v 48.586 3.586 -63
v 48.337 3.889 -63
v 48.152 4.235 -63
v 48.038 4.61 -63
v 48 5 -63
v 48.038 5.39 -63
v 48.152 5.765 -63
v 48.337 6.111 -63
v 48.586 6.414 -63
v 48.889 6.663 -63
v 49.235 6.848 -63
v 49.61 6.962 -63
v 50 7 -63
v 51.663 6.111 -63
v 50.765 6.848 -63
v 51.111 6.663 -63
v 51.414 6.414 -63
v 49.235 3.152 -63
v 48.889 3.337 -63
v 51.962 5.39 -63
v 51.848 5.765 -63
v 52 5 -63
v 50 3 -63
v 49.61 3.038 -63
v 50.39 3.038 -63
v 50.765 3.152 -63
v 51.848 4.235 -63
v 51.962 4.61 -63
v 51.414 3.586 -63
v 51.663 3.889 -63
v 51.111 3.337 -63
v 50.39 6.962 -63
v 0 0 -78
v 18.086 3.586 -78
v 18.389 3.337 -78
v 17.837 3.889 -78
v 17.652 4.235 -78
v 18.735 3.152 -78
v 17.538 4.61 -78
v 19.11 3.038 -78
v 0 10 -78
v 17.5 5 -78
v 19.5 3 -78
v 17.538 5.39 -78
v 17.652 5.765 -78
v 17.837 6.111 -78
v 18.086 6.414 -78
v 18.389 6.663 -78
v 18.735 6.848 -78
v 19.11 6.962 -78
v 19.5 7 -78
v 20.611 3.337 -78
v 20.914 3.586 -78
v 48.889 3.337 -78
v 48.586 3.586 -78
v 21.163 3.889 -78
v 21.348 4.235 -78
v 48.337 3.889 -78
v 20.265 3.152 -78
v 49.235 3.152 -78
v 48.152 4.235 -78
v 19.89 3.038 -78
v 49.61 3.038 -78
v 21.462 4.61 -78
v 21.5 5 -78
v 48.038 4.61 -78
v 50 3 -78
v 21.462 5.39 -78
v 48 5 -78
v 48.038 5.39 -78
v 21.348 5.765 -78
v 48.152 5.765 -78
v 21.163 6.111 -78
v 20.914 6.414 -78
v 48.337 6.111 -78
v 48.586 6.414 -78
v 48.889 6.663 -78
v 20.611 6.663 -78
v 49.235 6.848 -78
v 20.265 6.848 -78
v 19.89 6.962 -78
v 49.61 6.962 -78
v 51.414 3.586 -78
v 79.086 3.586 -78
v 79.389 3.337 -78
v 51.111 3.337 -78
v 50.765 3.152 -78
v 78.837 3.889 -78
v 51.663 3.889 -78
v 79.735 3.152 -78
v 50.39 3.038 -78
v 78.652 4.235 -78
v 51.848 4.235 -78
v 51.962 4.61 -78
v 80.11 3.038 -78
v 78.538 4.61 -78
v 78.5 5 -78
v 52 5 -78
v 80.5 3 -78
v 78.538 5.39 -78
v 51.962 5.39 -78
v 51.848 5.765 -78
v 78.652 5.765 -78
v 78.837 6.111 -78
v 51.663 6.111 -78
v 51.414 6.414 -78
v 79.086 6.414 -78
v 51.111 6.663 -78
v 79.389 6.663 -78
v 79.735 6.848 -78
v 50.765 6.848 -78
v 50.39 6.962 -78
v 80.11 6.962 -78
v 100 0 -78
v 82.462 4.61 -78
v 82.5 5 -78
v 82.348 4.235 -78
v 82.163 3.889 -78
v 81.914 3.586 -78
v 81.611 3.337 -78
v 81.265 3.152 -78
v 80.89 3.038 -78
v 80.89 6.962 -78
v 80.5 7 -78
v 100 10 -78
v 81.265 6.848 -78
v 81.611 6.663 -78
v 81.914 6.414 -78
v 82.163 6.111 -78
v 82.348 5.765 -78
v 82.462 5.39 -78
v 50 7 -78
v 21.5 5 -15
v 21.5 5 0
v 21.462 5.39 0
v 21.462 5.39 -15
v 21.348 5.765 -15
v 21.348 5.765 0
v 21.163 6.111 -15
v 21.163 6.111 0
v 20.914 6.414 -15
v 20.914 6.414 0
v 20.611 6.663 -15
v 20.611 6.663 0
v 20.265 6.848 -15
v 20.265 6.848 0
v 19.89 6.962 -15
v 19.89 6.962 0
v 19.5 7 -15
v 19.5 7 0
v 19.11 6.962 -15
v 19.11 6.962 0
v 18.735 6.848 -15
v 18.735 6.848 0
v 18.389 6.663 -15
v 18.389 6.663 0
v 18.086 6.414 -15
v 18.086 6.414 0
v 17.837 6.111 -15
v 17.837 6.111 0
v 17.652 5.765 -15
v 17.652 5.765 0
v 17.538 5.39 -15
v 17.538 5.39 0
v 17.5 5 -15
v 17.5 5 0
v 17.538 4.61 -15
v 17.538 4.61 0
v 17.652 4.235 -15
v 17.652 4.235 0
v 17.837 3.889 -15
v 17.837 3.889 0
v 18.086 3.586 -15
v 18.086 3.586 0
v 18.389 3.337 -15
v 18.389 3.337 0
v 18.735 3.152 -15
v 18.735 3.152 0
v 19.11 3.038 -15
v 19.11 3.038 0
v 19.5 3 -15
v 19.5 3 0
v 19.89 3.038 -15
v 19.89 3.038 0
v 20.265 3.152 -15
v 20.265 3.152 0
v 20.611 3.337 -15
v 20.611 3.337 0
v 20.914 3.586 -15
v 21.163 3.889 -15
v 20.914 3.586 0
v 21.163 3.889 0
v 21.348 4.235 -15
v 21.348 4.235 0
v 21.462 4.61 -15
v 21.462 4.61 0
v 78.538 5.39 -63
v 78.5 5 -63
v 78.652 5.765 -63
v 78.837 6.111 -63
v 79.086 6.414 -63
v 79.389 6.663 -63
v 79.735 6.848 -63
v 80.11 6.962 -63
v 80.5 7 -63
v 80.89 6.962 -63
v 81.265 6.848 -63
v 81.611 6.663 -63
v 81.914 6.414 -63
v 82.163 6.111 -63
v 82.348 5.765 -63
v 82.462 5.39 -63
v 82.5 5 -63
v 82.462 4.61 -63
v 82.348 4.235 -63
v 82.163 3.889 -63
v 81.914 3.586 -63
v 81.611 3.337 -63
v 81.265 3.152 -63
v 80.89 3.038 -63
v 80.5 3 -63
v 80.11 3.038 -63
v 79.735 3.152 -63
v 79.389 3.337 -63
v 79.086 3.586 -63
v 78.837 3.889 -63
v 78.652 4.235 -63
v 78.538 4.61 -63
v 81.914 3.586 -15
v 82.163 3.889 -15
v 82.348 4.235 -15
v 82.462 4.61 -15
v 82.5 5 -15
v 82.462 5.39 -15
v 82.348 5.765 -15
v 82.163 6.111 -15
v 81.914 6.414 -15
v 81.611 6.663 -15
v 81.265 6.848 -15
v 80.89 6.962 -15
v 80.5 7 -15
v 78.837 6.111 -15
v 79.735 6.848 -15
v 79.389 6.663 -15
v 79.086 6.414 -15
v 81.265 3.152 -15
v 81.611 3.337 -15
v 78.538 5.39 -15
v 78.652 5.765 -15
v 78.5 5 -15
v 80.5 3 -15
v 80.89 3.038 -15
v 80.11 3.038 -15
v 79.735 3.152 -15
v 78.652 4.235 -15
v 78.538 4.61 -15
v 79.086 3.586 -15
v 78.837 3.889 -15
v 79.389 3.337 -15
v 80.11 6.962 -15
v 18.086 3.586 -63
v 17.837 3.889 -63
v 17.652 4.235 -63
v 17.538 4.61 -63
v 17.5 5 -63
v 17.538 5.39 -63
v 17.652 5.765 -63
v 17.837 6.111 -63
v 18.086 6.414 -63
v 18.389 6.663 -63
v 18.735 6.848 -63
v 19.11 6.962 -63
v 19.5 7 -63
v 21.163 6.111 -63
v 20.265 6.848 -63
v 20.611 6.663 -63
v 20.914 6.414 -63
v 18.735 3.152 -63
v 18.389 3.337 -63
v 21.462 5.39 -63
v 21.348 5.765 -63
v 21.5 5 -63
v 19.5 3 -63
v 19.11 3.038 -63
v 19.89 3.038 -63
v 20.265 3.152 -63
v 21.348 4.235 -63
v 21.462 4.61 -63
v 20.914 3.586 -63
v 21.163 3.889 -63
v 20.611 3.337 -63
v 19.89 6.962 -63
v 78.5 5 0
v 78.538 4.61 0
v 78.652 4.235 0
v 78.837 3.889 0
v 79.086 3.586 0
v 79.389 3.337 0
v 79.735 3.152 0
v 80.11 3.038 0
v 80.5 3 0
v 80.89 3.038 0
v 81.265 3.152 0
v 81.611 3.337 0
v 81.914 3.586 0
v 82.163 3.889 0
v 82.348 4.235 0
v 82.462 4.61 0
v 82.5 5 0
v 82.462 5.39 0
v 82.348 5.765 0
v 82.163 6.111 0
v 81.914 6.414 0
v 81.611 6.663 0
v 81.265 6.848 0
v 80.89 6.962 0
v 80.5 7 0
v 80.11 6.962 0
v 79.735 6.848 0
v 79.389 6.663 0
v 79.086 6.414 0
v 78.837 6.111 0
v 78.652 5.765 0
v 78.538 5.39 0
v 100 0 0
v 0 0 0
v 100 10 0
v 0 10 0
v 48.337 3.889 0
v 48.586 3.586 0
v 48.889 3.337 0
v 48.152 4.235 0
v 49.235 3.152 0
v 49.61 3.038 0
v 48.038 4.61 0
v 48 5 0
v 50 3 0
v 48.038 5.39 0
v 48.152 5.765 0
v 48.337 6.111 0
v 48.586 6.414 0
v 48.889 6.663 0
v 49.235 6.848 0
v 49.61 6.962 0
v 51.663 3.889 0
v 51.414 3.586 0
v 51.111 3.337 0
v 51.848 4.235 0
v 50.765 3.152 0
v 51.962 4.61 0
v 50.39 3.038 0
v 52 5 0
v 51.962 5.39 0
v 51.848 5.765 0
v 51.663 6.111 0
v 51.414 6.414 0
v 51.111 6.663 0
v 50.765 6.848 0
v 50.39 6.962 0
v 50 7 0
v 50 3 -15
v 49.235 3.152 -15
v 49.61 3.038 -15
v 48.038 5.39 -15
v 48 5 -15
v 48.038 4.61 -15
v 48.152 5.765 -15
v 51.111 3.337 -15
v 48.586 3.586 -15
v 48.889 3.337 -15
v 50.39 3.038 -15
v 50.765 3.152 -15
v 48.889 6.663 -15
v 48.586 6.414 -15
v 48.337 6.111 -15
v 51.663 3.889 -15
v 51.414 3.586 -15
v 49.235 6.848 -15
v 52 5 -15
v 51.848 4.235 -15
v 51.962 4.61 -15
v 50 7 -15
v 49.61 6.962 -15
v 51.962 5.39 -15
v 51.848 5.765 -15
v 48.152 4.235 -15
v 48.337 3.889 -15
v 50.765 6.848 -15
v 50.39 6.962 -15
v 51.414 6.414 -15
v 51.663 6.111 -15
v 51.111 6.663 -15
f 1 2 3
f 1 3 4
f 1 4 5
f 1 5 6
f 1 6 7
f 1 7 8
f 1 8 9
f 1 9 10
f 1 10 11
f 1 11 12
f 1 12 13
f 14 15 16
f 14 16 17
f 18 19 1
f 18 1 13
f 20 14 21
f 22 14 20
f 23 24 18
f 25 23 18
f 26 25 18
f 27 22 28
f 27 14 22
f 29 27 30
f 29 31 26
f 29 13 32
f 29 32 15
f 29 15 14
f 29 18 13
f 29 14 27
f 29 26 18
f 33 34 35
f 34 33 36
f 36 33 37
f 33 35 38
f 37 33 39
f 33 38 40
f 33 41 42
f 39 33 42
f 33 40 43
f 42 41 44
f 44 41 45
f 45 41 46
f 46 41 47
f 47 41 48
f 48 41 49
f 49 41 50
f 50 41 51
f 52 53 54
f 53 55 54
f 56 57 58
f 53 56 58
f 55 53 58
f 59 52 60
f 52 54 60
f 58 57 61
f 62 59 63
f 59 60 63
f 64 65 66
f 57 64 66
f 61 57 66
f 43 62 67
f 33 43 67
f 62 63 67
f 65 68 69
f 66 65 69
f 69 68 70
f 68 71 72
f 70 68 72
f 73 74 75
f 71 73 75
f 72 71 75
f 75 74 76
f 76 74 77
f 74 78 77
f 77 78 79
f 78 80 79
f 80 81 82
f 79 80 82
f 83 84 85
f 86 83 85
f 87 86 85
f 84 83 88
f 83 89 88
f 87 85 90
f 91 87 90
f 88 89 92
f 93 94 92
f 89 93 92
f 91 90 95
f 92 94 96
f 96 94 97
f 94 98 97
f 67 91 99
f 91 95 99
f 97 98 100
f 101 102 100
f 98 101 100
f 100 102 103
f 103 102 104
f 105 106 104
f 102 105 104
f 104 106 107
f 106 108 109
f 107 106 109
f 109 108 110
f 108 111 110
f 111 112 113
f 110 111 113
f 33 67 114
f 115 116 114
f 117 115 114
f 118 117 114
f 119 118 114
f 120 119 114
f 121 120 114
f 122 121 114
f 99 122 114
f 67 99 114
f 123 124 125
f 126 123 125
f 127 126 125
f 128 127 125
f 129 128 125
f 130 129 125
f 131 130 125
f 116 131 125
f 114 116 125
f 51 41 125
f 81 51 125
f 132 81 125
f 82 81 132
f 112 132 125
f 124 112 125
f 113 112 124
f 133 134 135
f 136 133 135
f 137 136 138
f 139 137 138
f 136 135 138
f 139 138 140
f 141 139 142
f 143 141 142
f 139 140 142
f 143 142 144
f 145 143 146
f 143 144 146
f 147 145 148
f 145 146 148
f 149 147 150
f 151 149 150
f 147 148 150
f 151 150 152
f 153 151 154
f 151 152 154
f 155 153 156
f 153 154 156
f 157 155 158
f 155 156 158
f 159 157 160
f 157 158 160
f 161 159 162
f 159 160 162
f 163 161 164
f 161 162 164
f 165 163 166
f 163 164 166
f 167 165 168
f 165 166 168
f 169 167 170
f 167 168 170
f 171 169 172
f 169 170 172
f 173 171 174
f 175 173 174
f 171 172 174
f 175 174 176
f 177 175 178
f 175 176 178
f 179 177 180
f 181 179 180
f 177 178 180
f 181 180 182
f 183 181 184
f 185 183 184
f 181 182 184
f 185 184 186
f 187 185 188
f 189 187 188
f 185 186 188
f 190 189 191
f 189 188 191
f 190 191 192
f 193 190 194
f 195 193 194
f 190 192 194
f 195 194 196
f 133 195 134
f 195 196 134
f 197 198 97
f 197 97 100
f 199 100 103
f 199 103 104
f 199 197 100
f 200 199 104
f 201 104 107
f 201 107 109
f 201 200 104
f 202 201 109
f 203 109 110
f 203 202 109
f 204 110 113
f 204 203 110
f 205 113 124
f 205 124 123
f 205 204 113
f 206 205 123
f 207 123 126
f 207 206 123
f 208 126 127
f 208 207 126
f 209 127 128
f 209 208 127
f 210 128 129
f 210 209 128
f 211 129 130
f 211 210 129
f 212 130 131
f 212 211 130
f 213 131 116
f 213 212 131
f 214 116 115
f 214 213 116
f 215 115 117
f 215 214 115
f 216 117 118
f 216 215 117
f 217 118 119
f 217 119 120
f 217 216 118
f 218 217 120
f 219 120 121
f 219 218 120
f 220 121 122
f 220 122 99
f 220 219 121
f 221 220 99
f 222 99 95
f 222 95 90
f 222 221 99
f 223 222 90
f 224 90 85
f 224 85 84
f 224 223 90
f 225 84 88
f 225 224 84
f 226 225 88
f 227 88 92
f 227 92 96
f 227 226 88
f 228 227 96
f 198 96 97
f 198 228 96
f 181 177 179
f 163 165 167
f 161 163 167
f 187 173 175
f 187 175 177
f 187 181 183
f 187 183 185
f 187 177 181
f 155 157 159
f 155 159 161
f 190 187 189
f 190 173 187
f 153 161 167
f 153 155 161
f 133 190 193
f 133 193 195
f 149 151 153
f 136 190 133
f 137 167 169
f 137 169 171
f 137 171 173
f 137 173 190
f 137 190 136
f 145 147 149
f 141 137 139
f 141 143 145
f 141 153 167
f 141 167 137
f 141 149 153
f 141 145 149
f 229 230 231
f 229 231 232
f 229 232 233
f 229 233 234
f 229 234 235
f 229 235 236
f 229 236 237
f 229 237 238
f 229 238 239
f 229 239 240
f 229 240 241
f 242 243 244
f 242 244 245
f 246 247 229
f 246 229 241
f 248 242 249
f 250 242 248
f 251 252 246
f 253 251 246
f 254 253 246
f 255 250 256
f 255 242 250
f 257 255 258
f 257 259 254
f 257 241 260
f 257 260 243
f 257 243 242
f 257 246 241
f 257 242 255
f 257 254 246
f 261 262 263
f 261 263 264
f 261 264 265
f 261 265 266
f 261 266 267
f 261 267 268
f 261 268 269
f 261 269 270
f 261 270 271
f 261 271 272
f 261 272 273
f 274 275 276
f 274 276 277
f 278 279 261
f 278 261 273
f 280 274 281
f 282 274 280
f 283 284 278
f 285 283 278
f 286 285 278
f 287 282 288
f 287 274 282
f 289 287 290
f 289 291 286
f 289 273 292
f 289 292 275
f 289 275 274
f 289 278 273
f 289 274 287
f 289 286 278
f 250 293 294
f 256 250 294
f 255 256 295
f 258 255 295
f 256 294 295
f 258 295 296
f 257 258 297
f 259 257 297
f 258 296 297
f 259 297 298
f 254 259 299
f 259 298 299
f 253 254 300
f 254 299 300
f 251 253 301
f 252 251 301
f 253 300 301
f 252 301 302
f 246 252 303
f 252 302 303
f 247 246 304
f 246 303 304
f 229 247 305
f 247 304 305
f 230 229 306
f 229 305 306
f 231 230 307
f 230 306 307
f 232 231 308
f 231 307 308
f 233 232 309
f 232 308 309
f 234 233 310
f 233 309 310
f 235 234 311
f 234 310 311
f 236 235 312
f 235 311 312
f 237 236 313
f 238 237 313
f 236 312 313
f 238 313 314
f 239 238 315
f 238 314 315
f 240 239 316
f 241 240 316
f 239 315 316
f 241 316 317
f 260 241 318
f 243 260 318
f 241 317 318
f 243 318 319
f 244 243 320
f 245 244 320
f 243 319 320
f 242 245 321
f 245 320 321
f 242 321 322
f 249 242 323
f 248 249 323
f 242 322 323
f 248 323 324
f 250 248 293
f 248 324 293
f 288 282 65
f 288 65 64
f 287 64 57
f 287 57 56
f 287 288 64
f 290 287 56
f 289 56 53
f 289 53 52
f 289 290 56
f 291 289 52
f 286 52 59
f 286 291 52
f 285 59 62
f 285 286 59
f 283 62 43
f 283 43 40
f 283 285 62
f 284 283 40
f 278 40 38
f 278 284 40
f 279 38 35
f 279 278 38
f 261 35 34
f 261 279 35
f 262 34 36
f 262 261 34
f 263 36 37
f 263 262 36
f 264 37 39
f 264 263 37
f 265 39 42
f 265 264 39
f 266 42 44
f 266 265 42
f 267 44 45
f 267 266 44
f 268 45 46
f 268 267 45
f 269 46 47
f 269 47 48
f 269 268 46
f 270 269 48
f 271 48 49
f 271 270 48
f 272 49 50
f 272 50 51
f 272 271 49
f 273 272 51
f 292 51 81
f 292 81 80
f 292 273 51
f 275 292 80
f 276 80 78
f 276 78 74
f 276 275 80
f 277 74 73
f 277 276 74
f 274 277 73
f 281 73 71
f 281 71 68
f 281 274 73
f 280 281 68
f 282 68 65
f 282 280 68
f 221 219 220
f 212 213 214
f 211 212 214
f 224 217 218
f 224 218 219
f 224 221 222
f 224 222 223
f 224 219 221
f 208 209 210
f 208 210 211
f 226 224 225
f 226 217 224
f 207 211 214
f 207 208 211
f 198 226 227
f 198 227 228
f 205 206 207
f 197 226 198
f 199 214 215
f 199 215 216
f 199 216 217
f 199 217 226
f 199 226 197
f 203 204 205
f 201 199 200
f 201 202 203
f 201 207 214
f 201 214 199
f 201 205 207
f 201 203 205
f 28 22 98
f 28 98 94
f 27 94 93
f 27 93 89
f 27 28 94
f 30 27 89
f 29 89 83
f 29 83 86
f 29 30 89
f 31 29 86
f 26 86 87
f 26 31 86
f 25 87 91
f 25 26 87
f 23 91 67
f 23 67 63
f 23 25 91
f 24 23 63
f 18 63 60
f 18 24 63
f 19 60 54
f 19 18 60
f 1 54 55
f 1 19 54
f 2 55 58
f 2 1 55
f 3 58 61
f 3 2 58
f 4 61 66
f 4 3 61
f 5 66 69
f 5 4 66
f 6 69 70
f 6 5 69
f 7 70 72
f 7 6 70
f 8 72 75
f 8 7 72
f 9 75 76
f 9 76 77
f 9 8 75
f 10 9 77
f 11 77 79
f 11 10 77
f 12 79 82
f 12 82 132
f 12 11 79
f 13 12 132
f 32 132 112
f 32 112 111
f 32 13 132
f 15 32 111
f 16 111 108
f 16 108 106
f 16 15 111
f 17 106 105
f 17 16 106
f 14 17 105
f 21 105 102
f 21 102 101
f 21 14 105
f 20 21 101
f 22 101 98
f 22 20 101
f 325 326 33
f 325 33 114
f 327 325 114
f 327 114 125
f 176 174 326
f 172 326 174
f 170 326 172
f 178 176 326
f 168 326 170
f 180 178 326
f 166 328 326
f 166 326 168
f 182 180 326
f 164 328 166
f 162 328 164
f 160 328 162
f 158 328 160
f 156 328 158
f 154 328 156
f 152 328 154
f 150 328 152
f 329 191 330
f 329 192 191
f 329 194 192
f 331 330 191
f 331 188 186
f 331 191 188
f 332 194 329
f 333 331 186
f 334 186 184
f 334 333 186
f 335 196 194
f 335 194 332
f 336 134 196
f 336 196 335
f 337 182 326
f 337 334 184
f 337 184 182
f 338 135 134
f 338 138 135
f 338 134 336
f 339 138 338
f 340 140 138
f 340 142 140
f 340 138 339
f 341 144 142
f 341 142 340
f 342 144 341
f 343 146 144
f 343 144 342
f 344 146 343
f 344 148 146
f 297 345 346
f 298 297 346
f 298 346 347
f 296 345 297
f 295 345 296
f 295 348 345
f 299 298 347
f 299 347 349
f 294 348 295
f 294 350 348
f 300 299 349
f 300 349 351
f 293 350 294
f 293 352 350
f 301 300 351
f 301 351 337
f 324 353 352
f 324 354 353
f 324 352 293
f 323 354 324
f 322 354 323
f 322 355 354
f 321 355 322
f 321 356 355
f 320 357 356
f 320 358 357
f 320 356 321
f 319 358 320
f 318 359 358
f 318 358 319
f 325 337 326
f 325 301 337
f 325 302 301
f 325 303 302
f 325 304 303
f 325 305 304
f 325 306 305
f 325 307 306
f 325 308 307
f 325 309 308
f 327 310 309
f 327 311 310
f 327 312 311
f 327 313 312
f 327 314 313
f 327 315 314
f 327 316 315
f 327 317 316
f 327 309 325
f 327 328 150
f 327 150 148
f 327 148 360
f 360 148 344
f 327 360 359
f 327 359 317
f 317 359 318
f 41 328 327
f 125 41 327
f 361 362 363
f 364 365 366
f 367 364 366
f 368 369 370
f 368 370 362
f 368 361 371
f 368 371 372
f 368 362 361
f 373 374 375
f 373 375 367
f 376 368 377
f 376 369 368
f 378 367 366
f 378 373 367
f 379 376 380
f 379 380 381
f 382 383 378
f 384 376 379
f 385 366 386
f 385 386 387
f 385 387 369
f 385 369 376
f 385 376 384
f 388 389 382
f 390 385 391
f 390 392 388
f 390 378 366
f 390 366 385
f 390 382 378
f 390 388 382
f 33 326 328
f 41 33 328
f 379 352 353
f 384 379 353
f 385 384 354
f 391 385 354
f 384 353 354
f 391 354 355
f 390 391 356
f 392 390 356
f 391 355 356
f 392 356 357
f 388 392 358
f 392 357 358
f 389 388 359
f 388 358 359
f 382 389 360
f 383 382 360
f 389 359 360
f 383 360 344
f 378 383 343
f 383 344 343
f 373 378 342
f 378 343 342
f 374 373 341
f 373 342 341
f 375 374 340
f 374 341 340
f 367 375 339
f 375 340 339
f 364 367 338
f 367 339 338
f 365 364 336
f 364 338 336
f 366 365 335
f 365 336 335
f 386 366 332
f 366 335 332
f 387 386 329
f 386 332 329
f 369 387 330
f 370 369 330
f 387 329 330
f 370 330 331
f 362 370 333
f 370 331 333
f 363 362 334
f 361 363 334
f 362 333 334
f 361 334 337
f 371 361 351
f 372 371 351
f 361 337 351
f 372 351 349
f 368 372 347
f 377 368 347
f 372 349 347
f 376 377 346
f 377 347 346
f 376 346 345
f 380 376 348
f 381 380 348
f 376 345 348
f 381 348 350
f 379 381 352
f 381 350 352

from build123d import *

# Parameters (mm, degrees)
SCHIZZO2_W                   = 100
SCHIZZO2_H                   = 10
ESTRUSIONE_ESTRUSIONE1_DEPTH = 78
SCHIZZO3_R                   = 2
TAGLIO_ESTRUSIONE1_DEPTH     = 15
TAGLIO_ESTRUSIONE2_START     = -15
SCHIZZO4_R                   = 2
TAGLIO_ESTRUSIONE2_DEPTH     = 15


with BuildPart() as part:
    # Schizzo2 → Estrusione-Estrusione1 (new body)
    with BuildSketch(Plane.XY):
        with Locations((50, 5)):
            Rectangle(SCHIZZO2_W, SCHIZZO2_H)
    extrude(amount=-ESTRUSIONE_ESTRUSIONE1_DEPTH)

    # Schizzo3 → Taglio-Estrusione1 (cut)
    with BuildSketch(Plane.XY):
        with Locations((19.5, 5)):
            Circle(SCHIZZO3_R)
        with Locations((50, 5)):
            Circle(SCHIZZO3_R)
        with Locations(Location((80.5, 5, 0), (0, 0, 180))):
            Circle(SCHIZZO3_R)
    extrude(amount=-TAGLIO_ESTRUSIONE1_DEPTH, mode=Mode.SUBTRACT)

    # Schizzo4 → Taglio-Estrusione2 (cut)
    with BuildSketch(Plane(origin=(0, 0, -78), x_dir=(-1, 0, 0), z_dir=(0, 0, -1)).offset(TAGLIO_ESTRUSIONE2_START)):
        with Locations((-80.5, 5)):
            Circle(SCHIZZO4_R)
        with Locations(Location((-50, 5, 0), (0, 0, 180))):
            Circle(SCHIZZO4_R)
        with Locations(Location((-19.5, 5, 0), (0, 0, 180))):
            Circle(SCHIZZO4_R)
    extrude(amount=TAGLIO_ESTRUSIONE2_DEPTH, mode=Mode.SUBTRACT)


solid = part.part
